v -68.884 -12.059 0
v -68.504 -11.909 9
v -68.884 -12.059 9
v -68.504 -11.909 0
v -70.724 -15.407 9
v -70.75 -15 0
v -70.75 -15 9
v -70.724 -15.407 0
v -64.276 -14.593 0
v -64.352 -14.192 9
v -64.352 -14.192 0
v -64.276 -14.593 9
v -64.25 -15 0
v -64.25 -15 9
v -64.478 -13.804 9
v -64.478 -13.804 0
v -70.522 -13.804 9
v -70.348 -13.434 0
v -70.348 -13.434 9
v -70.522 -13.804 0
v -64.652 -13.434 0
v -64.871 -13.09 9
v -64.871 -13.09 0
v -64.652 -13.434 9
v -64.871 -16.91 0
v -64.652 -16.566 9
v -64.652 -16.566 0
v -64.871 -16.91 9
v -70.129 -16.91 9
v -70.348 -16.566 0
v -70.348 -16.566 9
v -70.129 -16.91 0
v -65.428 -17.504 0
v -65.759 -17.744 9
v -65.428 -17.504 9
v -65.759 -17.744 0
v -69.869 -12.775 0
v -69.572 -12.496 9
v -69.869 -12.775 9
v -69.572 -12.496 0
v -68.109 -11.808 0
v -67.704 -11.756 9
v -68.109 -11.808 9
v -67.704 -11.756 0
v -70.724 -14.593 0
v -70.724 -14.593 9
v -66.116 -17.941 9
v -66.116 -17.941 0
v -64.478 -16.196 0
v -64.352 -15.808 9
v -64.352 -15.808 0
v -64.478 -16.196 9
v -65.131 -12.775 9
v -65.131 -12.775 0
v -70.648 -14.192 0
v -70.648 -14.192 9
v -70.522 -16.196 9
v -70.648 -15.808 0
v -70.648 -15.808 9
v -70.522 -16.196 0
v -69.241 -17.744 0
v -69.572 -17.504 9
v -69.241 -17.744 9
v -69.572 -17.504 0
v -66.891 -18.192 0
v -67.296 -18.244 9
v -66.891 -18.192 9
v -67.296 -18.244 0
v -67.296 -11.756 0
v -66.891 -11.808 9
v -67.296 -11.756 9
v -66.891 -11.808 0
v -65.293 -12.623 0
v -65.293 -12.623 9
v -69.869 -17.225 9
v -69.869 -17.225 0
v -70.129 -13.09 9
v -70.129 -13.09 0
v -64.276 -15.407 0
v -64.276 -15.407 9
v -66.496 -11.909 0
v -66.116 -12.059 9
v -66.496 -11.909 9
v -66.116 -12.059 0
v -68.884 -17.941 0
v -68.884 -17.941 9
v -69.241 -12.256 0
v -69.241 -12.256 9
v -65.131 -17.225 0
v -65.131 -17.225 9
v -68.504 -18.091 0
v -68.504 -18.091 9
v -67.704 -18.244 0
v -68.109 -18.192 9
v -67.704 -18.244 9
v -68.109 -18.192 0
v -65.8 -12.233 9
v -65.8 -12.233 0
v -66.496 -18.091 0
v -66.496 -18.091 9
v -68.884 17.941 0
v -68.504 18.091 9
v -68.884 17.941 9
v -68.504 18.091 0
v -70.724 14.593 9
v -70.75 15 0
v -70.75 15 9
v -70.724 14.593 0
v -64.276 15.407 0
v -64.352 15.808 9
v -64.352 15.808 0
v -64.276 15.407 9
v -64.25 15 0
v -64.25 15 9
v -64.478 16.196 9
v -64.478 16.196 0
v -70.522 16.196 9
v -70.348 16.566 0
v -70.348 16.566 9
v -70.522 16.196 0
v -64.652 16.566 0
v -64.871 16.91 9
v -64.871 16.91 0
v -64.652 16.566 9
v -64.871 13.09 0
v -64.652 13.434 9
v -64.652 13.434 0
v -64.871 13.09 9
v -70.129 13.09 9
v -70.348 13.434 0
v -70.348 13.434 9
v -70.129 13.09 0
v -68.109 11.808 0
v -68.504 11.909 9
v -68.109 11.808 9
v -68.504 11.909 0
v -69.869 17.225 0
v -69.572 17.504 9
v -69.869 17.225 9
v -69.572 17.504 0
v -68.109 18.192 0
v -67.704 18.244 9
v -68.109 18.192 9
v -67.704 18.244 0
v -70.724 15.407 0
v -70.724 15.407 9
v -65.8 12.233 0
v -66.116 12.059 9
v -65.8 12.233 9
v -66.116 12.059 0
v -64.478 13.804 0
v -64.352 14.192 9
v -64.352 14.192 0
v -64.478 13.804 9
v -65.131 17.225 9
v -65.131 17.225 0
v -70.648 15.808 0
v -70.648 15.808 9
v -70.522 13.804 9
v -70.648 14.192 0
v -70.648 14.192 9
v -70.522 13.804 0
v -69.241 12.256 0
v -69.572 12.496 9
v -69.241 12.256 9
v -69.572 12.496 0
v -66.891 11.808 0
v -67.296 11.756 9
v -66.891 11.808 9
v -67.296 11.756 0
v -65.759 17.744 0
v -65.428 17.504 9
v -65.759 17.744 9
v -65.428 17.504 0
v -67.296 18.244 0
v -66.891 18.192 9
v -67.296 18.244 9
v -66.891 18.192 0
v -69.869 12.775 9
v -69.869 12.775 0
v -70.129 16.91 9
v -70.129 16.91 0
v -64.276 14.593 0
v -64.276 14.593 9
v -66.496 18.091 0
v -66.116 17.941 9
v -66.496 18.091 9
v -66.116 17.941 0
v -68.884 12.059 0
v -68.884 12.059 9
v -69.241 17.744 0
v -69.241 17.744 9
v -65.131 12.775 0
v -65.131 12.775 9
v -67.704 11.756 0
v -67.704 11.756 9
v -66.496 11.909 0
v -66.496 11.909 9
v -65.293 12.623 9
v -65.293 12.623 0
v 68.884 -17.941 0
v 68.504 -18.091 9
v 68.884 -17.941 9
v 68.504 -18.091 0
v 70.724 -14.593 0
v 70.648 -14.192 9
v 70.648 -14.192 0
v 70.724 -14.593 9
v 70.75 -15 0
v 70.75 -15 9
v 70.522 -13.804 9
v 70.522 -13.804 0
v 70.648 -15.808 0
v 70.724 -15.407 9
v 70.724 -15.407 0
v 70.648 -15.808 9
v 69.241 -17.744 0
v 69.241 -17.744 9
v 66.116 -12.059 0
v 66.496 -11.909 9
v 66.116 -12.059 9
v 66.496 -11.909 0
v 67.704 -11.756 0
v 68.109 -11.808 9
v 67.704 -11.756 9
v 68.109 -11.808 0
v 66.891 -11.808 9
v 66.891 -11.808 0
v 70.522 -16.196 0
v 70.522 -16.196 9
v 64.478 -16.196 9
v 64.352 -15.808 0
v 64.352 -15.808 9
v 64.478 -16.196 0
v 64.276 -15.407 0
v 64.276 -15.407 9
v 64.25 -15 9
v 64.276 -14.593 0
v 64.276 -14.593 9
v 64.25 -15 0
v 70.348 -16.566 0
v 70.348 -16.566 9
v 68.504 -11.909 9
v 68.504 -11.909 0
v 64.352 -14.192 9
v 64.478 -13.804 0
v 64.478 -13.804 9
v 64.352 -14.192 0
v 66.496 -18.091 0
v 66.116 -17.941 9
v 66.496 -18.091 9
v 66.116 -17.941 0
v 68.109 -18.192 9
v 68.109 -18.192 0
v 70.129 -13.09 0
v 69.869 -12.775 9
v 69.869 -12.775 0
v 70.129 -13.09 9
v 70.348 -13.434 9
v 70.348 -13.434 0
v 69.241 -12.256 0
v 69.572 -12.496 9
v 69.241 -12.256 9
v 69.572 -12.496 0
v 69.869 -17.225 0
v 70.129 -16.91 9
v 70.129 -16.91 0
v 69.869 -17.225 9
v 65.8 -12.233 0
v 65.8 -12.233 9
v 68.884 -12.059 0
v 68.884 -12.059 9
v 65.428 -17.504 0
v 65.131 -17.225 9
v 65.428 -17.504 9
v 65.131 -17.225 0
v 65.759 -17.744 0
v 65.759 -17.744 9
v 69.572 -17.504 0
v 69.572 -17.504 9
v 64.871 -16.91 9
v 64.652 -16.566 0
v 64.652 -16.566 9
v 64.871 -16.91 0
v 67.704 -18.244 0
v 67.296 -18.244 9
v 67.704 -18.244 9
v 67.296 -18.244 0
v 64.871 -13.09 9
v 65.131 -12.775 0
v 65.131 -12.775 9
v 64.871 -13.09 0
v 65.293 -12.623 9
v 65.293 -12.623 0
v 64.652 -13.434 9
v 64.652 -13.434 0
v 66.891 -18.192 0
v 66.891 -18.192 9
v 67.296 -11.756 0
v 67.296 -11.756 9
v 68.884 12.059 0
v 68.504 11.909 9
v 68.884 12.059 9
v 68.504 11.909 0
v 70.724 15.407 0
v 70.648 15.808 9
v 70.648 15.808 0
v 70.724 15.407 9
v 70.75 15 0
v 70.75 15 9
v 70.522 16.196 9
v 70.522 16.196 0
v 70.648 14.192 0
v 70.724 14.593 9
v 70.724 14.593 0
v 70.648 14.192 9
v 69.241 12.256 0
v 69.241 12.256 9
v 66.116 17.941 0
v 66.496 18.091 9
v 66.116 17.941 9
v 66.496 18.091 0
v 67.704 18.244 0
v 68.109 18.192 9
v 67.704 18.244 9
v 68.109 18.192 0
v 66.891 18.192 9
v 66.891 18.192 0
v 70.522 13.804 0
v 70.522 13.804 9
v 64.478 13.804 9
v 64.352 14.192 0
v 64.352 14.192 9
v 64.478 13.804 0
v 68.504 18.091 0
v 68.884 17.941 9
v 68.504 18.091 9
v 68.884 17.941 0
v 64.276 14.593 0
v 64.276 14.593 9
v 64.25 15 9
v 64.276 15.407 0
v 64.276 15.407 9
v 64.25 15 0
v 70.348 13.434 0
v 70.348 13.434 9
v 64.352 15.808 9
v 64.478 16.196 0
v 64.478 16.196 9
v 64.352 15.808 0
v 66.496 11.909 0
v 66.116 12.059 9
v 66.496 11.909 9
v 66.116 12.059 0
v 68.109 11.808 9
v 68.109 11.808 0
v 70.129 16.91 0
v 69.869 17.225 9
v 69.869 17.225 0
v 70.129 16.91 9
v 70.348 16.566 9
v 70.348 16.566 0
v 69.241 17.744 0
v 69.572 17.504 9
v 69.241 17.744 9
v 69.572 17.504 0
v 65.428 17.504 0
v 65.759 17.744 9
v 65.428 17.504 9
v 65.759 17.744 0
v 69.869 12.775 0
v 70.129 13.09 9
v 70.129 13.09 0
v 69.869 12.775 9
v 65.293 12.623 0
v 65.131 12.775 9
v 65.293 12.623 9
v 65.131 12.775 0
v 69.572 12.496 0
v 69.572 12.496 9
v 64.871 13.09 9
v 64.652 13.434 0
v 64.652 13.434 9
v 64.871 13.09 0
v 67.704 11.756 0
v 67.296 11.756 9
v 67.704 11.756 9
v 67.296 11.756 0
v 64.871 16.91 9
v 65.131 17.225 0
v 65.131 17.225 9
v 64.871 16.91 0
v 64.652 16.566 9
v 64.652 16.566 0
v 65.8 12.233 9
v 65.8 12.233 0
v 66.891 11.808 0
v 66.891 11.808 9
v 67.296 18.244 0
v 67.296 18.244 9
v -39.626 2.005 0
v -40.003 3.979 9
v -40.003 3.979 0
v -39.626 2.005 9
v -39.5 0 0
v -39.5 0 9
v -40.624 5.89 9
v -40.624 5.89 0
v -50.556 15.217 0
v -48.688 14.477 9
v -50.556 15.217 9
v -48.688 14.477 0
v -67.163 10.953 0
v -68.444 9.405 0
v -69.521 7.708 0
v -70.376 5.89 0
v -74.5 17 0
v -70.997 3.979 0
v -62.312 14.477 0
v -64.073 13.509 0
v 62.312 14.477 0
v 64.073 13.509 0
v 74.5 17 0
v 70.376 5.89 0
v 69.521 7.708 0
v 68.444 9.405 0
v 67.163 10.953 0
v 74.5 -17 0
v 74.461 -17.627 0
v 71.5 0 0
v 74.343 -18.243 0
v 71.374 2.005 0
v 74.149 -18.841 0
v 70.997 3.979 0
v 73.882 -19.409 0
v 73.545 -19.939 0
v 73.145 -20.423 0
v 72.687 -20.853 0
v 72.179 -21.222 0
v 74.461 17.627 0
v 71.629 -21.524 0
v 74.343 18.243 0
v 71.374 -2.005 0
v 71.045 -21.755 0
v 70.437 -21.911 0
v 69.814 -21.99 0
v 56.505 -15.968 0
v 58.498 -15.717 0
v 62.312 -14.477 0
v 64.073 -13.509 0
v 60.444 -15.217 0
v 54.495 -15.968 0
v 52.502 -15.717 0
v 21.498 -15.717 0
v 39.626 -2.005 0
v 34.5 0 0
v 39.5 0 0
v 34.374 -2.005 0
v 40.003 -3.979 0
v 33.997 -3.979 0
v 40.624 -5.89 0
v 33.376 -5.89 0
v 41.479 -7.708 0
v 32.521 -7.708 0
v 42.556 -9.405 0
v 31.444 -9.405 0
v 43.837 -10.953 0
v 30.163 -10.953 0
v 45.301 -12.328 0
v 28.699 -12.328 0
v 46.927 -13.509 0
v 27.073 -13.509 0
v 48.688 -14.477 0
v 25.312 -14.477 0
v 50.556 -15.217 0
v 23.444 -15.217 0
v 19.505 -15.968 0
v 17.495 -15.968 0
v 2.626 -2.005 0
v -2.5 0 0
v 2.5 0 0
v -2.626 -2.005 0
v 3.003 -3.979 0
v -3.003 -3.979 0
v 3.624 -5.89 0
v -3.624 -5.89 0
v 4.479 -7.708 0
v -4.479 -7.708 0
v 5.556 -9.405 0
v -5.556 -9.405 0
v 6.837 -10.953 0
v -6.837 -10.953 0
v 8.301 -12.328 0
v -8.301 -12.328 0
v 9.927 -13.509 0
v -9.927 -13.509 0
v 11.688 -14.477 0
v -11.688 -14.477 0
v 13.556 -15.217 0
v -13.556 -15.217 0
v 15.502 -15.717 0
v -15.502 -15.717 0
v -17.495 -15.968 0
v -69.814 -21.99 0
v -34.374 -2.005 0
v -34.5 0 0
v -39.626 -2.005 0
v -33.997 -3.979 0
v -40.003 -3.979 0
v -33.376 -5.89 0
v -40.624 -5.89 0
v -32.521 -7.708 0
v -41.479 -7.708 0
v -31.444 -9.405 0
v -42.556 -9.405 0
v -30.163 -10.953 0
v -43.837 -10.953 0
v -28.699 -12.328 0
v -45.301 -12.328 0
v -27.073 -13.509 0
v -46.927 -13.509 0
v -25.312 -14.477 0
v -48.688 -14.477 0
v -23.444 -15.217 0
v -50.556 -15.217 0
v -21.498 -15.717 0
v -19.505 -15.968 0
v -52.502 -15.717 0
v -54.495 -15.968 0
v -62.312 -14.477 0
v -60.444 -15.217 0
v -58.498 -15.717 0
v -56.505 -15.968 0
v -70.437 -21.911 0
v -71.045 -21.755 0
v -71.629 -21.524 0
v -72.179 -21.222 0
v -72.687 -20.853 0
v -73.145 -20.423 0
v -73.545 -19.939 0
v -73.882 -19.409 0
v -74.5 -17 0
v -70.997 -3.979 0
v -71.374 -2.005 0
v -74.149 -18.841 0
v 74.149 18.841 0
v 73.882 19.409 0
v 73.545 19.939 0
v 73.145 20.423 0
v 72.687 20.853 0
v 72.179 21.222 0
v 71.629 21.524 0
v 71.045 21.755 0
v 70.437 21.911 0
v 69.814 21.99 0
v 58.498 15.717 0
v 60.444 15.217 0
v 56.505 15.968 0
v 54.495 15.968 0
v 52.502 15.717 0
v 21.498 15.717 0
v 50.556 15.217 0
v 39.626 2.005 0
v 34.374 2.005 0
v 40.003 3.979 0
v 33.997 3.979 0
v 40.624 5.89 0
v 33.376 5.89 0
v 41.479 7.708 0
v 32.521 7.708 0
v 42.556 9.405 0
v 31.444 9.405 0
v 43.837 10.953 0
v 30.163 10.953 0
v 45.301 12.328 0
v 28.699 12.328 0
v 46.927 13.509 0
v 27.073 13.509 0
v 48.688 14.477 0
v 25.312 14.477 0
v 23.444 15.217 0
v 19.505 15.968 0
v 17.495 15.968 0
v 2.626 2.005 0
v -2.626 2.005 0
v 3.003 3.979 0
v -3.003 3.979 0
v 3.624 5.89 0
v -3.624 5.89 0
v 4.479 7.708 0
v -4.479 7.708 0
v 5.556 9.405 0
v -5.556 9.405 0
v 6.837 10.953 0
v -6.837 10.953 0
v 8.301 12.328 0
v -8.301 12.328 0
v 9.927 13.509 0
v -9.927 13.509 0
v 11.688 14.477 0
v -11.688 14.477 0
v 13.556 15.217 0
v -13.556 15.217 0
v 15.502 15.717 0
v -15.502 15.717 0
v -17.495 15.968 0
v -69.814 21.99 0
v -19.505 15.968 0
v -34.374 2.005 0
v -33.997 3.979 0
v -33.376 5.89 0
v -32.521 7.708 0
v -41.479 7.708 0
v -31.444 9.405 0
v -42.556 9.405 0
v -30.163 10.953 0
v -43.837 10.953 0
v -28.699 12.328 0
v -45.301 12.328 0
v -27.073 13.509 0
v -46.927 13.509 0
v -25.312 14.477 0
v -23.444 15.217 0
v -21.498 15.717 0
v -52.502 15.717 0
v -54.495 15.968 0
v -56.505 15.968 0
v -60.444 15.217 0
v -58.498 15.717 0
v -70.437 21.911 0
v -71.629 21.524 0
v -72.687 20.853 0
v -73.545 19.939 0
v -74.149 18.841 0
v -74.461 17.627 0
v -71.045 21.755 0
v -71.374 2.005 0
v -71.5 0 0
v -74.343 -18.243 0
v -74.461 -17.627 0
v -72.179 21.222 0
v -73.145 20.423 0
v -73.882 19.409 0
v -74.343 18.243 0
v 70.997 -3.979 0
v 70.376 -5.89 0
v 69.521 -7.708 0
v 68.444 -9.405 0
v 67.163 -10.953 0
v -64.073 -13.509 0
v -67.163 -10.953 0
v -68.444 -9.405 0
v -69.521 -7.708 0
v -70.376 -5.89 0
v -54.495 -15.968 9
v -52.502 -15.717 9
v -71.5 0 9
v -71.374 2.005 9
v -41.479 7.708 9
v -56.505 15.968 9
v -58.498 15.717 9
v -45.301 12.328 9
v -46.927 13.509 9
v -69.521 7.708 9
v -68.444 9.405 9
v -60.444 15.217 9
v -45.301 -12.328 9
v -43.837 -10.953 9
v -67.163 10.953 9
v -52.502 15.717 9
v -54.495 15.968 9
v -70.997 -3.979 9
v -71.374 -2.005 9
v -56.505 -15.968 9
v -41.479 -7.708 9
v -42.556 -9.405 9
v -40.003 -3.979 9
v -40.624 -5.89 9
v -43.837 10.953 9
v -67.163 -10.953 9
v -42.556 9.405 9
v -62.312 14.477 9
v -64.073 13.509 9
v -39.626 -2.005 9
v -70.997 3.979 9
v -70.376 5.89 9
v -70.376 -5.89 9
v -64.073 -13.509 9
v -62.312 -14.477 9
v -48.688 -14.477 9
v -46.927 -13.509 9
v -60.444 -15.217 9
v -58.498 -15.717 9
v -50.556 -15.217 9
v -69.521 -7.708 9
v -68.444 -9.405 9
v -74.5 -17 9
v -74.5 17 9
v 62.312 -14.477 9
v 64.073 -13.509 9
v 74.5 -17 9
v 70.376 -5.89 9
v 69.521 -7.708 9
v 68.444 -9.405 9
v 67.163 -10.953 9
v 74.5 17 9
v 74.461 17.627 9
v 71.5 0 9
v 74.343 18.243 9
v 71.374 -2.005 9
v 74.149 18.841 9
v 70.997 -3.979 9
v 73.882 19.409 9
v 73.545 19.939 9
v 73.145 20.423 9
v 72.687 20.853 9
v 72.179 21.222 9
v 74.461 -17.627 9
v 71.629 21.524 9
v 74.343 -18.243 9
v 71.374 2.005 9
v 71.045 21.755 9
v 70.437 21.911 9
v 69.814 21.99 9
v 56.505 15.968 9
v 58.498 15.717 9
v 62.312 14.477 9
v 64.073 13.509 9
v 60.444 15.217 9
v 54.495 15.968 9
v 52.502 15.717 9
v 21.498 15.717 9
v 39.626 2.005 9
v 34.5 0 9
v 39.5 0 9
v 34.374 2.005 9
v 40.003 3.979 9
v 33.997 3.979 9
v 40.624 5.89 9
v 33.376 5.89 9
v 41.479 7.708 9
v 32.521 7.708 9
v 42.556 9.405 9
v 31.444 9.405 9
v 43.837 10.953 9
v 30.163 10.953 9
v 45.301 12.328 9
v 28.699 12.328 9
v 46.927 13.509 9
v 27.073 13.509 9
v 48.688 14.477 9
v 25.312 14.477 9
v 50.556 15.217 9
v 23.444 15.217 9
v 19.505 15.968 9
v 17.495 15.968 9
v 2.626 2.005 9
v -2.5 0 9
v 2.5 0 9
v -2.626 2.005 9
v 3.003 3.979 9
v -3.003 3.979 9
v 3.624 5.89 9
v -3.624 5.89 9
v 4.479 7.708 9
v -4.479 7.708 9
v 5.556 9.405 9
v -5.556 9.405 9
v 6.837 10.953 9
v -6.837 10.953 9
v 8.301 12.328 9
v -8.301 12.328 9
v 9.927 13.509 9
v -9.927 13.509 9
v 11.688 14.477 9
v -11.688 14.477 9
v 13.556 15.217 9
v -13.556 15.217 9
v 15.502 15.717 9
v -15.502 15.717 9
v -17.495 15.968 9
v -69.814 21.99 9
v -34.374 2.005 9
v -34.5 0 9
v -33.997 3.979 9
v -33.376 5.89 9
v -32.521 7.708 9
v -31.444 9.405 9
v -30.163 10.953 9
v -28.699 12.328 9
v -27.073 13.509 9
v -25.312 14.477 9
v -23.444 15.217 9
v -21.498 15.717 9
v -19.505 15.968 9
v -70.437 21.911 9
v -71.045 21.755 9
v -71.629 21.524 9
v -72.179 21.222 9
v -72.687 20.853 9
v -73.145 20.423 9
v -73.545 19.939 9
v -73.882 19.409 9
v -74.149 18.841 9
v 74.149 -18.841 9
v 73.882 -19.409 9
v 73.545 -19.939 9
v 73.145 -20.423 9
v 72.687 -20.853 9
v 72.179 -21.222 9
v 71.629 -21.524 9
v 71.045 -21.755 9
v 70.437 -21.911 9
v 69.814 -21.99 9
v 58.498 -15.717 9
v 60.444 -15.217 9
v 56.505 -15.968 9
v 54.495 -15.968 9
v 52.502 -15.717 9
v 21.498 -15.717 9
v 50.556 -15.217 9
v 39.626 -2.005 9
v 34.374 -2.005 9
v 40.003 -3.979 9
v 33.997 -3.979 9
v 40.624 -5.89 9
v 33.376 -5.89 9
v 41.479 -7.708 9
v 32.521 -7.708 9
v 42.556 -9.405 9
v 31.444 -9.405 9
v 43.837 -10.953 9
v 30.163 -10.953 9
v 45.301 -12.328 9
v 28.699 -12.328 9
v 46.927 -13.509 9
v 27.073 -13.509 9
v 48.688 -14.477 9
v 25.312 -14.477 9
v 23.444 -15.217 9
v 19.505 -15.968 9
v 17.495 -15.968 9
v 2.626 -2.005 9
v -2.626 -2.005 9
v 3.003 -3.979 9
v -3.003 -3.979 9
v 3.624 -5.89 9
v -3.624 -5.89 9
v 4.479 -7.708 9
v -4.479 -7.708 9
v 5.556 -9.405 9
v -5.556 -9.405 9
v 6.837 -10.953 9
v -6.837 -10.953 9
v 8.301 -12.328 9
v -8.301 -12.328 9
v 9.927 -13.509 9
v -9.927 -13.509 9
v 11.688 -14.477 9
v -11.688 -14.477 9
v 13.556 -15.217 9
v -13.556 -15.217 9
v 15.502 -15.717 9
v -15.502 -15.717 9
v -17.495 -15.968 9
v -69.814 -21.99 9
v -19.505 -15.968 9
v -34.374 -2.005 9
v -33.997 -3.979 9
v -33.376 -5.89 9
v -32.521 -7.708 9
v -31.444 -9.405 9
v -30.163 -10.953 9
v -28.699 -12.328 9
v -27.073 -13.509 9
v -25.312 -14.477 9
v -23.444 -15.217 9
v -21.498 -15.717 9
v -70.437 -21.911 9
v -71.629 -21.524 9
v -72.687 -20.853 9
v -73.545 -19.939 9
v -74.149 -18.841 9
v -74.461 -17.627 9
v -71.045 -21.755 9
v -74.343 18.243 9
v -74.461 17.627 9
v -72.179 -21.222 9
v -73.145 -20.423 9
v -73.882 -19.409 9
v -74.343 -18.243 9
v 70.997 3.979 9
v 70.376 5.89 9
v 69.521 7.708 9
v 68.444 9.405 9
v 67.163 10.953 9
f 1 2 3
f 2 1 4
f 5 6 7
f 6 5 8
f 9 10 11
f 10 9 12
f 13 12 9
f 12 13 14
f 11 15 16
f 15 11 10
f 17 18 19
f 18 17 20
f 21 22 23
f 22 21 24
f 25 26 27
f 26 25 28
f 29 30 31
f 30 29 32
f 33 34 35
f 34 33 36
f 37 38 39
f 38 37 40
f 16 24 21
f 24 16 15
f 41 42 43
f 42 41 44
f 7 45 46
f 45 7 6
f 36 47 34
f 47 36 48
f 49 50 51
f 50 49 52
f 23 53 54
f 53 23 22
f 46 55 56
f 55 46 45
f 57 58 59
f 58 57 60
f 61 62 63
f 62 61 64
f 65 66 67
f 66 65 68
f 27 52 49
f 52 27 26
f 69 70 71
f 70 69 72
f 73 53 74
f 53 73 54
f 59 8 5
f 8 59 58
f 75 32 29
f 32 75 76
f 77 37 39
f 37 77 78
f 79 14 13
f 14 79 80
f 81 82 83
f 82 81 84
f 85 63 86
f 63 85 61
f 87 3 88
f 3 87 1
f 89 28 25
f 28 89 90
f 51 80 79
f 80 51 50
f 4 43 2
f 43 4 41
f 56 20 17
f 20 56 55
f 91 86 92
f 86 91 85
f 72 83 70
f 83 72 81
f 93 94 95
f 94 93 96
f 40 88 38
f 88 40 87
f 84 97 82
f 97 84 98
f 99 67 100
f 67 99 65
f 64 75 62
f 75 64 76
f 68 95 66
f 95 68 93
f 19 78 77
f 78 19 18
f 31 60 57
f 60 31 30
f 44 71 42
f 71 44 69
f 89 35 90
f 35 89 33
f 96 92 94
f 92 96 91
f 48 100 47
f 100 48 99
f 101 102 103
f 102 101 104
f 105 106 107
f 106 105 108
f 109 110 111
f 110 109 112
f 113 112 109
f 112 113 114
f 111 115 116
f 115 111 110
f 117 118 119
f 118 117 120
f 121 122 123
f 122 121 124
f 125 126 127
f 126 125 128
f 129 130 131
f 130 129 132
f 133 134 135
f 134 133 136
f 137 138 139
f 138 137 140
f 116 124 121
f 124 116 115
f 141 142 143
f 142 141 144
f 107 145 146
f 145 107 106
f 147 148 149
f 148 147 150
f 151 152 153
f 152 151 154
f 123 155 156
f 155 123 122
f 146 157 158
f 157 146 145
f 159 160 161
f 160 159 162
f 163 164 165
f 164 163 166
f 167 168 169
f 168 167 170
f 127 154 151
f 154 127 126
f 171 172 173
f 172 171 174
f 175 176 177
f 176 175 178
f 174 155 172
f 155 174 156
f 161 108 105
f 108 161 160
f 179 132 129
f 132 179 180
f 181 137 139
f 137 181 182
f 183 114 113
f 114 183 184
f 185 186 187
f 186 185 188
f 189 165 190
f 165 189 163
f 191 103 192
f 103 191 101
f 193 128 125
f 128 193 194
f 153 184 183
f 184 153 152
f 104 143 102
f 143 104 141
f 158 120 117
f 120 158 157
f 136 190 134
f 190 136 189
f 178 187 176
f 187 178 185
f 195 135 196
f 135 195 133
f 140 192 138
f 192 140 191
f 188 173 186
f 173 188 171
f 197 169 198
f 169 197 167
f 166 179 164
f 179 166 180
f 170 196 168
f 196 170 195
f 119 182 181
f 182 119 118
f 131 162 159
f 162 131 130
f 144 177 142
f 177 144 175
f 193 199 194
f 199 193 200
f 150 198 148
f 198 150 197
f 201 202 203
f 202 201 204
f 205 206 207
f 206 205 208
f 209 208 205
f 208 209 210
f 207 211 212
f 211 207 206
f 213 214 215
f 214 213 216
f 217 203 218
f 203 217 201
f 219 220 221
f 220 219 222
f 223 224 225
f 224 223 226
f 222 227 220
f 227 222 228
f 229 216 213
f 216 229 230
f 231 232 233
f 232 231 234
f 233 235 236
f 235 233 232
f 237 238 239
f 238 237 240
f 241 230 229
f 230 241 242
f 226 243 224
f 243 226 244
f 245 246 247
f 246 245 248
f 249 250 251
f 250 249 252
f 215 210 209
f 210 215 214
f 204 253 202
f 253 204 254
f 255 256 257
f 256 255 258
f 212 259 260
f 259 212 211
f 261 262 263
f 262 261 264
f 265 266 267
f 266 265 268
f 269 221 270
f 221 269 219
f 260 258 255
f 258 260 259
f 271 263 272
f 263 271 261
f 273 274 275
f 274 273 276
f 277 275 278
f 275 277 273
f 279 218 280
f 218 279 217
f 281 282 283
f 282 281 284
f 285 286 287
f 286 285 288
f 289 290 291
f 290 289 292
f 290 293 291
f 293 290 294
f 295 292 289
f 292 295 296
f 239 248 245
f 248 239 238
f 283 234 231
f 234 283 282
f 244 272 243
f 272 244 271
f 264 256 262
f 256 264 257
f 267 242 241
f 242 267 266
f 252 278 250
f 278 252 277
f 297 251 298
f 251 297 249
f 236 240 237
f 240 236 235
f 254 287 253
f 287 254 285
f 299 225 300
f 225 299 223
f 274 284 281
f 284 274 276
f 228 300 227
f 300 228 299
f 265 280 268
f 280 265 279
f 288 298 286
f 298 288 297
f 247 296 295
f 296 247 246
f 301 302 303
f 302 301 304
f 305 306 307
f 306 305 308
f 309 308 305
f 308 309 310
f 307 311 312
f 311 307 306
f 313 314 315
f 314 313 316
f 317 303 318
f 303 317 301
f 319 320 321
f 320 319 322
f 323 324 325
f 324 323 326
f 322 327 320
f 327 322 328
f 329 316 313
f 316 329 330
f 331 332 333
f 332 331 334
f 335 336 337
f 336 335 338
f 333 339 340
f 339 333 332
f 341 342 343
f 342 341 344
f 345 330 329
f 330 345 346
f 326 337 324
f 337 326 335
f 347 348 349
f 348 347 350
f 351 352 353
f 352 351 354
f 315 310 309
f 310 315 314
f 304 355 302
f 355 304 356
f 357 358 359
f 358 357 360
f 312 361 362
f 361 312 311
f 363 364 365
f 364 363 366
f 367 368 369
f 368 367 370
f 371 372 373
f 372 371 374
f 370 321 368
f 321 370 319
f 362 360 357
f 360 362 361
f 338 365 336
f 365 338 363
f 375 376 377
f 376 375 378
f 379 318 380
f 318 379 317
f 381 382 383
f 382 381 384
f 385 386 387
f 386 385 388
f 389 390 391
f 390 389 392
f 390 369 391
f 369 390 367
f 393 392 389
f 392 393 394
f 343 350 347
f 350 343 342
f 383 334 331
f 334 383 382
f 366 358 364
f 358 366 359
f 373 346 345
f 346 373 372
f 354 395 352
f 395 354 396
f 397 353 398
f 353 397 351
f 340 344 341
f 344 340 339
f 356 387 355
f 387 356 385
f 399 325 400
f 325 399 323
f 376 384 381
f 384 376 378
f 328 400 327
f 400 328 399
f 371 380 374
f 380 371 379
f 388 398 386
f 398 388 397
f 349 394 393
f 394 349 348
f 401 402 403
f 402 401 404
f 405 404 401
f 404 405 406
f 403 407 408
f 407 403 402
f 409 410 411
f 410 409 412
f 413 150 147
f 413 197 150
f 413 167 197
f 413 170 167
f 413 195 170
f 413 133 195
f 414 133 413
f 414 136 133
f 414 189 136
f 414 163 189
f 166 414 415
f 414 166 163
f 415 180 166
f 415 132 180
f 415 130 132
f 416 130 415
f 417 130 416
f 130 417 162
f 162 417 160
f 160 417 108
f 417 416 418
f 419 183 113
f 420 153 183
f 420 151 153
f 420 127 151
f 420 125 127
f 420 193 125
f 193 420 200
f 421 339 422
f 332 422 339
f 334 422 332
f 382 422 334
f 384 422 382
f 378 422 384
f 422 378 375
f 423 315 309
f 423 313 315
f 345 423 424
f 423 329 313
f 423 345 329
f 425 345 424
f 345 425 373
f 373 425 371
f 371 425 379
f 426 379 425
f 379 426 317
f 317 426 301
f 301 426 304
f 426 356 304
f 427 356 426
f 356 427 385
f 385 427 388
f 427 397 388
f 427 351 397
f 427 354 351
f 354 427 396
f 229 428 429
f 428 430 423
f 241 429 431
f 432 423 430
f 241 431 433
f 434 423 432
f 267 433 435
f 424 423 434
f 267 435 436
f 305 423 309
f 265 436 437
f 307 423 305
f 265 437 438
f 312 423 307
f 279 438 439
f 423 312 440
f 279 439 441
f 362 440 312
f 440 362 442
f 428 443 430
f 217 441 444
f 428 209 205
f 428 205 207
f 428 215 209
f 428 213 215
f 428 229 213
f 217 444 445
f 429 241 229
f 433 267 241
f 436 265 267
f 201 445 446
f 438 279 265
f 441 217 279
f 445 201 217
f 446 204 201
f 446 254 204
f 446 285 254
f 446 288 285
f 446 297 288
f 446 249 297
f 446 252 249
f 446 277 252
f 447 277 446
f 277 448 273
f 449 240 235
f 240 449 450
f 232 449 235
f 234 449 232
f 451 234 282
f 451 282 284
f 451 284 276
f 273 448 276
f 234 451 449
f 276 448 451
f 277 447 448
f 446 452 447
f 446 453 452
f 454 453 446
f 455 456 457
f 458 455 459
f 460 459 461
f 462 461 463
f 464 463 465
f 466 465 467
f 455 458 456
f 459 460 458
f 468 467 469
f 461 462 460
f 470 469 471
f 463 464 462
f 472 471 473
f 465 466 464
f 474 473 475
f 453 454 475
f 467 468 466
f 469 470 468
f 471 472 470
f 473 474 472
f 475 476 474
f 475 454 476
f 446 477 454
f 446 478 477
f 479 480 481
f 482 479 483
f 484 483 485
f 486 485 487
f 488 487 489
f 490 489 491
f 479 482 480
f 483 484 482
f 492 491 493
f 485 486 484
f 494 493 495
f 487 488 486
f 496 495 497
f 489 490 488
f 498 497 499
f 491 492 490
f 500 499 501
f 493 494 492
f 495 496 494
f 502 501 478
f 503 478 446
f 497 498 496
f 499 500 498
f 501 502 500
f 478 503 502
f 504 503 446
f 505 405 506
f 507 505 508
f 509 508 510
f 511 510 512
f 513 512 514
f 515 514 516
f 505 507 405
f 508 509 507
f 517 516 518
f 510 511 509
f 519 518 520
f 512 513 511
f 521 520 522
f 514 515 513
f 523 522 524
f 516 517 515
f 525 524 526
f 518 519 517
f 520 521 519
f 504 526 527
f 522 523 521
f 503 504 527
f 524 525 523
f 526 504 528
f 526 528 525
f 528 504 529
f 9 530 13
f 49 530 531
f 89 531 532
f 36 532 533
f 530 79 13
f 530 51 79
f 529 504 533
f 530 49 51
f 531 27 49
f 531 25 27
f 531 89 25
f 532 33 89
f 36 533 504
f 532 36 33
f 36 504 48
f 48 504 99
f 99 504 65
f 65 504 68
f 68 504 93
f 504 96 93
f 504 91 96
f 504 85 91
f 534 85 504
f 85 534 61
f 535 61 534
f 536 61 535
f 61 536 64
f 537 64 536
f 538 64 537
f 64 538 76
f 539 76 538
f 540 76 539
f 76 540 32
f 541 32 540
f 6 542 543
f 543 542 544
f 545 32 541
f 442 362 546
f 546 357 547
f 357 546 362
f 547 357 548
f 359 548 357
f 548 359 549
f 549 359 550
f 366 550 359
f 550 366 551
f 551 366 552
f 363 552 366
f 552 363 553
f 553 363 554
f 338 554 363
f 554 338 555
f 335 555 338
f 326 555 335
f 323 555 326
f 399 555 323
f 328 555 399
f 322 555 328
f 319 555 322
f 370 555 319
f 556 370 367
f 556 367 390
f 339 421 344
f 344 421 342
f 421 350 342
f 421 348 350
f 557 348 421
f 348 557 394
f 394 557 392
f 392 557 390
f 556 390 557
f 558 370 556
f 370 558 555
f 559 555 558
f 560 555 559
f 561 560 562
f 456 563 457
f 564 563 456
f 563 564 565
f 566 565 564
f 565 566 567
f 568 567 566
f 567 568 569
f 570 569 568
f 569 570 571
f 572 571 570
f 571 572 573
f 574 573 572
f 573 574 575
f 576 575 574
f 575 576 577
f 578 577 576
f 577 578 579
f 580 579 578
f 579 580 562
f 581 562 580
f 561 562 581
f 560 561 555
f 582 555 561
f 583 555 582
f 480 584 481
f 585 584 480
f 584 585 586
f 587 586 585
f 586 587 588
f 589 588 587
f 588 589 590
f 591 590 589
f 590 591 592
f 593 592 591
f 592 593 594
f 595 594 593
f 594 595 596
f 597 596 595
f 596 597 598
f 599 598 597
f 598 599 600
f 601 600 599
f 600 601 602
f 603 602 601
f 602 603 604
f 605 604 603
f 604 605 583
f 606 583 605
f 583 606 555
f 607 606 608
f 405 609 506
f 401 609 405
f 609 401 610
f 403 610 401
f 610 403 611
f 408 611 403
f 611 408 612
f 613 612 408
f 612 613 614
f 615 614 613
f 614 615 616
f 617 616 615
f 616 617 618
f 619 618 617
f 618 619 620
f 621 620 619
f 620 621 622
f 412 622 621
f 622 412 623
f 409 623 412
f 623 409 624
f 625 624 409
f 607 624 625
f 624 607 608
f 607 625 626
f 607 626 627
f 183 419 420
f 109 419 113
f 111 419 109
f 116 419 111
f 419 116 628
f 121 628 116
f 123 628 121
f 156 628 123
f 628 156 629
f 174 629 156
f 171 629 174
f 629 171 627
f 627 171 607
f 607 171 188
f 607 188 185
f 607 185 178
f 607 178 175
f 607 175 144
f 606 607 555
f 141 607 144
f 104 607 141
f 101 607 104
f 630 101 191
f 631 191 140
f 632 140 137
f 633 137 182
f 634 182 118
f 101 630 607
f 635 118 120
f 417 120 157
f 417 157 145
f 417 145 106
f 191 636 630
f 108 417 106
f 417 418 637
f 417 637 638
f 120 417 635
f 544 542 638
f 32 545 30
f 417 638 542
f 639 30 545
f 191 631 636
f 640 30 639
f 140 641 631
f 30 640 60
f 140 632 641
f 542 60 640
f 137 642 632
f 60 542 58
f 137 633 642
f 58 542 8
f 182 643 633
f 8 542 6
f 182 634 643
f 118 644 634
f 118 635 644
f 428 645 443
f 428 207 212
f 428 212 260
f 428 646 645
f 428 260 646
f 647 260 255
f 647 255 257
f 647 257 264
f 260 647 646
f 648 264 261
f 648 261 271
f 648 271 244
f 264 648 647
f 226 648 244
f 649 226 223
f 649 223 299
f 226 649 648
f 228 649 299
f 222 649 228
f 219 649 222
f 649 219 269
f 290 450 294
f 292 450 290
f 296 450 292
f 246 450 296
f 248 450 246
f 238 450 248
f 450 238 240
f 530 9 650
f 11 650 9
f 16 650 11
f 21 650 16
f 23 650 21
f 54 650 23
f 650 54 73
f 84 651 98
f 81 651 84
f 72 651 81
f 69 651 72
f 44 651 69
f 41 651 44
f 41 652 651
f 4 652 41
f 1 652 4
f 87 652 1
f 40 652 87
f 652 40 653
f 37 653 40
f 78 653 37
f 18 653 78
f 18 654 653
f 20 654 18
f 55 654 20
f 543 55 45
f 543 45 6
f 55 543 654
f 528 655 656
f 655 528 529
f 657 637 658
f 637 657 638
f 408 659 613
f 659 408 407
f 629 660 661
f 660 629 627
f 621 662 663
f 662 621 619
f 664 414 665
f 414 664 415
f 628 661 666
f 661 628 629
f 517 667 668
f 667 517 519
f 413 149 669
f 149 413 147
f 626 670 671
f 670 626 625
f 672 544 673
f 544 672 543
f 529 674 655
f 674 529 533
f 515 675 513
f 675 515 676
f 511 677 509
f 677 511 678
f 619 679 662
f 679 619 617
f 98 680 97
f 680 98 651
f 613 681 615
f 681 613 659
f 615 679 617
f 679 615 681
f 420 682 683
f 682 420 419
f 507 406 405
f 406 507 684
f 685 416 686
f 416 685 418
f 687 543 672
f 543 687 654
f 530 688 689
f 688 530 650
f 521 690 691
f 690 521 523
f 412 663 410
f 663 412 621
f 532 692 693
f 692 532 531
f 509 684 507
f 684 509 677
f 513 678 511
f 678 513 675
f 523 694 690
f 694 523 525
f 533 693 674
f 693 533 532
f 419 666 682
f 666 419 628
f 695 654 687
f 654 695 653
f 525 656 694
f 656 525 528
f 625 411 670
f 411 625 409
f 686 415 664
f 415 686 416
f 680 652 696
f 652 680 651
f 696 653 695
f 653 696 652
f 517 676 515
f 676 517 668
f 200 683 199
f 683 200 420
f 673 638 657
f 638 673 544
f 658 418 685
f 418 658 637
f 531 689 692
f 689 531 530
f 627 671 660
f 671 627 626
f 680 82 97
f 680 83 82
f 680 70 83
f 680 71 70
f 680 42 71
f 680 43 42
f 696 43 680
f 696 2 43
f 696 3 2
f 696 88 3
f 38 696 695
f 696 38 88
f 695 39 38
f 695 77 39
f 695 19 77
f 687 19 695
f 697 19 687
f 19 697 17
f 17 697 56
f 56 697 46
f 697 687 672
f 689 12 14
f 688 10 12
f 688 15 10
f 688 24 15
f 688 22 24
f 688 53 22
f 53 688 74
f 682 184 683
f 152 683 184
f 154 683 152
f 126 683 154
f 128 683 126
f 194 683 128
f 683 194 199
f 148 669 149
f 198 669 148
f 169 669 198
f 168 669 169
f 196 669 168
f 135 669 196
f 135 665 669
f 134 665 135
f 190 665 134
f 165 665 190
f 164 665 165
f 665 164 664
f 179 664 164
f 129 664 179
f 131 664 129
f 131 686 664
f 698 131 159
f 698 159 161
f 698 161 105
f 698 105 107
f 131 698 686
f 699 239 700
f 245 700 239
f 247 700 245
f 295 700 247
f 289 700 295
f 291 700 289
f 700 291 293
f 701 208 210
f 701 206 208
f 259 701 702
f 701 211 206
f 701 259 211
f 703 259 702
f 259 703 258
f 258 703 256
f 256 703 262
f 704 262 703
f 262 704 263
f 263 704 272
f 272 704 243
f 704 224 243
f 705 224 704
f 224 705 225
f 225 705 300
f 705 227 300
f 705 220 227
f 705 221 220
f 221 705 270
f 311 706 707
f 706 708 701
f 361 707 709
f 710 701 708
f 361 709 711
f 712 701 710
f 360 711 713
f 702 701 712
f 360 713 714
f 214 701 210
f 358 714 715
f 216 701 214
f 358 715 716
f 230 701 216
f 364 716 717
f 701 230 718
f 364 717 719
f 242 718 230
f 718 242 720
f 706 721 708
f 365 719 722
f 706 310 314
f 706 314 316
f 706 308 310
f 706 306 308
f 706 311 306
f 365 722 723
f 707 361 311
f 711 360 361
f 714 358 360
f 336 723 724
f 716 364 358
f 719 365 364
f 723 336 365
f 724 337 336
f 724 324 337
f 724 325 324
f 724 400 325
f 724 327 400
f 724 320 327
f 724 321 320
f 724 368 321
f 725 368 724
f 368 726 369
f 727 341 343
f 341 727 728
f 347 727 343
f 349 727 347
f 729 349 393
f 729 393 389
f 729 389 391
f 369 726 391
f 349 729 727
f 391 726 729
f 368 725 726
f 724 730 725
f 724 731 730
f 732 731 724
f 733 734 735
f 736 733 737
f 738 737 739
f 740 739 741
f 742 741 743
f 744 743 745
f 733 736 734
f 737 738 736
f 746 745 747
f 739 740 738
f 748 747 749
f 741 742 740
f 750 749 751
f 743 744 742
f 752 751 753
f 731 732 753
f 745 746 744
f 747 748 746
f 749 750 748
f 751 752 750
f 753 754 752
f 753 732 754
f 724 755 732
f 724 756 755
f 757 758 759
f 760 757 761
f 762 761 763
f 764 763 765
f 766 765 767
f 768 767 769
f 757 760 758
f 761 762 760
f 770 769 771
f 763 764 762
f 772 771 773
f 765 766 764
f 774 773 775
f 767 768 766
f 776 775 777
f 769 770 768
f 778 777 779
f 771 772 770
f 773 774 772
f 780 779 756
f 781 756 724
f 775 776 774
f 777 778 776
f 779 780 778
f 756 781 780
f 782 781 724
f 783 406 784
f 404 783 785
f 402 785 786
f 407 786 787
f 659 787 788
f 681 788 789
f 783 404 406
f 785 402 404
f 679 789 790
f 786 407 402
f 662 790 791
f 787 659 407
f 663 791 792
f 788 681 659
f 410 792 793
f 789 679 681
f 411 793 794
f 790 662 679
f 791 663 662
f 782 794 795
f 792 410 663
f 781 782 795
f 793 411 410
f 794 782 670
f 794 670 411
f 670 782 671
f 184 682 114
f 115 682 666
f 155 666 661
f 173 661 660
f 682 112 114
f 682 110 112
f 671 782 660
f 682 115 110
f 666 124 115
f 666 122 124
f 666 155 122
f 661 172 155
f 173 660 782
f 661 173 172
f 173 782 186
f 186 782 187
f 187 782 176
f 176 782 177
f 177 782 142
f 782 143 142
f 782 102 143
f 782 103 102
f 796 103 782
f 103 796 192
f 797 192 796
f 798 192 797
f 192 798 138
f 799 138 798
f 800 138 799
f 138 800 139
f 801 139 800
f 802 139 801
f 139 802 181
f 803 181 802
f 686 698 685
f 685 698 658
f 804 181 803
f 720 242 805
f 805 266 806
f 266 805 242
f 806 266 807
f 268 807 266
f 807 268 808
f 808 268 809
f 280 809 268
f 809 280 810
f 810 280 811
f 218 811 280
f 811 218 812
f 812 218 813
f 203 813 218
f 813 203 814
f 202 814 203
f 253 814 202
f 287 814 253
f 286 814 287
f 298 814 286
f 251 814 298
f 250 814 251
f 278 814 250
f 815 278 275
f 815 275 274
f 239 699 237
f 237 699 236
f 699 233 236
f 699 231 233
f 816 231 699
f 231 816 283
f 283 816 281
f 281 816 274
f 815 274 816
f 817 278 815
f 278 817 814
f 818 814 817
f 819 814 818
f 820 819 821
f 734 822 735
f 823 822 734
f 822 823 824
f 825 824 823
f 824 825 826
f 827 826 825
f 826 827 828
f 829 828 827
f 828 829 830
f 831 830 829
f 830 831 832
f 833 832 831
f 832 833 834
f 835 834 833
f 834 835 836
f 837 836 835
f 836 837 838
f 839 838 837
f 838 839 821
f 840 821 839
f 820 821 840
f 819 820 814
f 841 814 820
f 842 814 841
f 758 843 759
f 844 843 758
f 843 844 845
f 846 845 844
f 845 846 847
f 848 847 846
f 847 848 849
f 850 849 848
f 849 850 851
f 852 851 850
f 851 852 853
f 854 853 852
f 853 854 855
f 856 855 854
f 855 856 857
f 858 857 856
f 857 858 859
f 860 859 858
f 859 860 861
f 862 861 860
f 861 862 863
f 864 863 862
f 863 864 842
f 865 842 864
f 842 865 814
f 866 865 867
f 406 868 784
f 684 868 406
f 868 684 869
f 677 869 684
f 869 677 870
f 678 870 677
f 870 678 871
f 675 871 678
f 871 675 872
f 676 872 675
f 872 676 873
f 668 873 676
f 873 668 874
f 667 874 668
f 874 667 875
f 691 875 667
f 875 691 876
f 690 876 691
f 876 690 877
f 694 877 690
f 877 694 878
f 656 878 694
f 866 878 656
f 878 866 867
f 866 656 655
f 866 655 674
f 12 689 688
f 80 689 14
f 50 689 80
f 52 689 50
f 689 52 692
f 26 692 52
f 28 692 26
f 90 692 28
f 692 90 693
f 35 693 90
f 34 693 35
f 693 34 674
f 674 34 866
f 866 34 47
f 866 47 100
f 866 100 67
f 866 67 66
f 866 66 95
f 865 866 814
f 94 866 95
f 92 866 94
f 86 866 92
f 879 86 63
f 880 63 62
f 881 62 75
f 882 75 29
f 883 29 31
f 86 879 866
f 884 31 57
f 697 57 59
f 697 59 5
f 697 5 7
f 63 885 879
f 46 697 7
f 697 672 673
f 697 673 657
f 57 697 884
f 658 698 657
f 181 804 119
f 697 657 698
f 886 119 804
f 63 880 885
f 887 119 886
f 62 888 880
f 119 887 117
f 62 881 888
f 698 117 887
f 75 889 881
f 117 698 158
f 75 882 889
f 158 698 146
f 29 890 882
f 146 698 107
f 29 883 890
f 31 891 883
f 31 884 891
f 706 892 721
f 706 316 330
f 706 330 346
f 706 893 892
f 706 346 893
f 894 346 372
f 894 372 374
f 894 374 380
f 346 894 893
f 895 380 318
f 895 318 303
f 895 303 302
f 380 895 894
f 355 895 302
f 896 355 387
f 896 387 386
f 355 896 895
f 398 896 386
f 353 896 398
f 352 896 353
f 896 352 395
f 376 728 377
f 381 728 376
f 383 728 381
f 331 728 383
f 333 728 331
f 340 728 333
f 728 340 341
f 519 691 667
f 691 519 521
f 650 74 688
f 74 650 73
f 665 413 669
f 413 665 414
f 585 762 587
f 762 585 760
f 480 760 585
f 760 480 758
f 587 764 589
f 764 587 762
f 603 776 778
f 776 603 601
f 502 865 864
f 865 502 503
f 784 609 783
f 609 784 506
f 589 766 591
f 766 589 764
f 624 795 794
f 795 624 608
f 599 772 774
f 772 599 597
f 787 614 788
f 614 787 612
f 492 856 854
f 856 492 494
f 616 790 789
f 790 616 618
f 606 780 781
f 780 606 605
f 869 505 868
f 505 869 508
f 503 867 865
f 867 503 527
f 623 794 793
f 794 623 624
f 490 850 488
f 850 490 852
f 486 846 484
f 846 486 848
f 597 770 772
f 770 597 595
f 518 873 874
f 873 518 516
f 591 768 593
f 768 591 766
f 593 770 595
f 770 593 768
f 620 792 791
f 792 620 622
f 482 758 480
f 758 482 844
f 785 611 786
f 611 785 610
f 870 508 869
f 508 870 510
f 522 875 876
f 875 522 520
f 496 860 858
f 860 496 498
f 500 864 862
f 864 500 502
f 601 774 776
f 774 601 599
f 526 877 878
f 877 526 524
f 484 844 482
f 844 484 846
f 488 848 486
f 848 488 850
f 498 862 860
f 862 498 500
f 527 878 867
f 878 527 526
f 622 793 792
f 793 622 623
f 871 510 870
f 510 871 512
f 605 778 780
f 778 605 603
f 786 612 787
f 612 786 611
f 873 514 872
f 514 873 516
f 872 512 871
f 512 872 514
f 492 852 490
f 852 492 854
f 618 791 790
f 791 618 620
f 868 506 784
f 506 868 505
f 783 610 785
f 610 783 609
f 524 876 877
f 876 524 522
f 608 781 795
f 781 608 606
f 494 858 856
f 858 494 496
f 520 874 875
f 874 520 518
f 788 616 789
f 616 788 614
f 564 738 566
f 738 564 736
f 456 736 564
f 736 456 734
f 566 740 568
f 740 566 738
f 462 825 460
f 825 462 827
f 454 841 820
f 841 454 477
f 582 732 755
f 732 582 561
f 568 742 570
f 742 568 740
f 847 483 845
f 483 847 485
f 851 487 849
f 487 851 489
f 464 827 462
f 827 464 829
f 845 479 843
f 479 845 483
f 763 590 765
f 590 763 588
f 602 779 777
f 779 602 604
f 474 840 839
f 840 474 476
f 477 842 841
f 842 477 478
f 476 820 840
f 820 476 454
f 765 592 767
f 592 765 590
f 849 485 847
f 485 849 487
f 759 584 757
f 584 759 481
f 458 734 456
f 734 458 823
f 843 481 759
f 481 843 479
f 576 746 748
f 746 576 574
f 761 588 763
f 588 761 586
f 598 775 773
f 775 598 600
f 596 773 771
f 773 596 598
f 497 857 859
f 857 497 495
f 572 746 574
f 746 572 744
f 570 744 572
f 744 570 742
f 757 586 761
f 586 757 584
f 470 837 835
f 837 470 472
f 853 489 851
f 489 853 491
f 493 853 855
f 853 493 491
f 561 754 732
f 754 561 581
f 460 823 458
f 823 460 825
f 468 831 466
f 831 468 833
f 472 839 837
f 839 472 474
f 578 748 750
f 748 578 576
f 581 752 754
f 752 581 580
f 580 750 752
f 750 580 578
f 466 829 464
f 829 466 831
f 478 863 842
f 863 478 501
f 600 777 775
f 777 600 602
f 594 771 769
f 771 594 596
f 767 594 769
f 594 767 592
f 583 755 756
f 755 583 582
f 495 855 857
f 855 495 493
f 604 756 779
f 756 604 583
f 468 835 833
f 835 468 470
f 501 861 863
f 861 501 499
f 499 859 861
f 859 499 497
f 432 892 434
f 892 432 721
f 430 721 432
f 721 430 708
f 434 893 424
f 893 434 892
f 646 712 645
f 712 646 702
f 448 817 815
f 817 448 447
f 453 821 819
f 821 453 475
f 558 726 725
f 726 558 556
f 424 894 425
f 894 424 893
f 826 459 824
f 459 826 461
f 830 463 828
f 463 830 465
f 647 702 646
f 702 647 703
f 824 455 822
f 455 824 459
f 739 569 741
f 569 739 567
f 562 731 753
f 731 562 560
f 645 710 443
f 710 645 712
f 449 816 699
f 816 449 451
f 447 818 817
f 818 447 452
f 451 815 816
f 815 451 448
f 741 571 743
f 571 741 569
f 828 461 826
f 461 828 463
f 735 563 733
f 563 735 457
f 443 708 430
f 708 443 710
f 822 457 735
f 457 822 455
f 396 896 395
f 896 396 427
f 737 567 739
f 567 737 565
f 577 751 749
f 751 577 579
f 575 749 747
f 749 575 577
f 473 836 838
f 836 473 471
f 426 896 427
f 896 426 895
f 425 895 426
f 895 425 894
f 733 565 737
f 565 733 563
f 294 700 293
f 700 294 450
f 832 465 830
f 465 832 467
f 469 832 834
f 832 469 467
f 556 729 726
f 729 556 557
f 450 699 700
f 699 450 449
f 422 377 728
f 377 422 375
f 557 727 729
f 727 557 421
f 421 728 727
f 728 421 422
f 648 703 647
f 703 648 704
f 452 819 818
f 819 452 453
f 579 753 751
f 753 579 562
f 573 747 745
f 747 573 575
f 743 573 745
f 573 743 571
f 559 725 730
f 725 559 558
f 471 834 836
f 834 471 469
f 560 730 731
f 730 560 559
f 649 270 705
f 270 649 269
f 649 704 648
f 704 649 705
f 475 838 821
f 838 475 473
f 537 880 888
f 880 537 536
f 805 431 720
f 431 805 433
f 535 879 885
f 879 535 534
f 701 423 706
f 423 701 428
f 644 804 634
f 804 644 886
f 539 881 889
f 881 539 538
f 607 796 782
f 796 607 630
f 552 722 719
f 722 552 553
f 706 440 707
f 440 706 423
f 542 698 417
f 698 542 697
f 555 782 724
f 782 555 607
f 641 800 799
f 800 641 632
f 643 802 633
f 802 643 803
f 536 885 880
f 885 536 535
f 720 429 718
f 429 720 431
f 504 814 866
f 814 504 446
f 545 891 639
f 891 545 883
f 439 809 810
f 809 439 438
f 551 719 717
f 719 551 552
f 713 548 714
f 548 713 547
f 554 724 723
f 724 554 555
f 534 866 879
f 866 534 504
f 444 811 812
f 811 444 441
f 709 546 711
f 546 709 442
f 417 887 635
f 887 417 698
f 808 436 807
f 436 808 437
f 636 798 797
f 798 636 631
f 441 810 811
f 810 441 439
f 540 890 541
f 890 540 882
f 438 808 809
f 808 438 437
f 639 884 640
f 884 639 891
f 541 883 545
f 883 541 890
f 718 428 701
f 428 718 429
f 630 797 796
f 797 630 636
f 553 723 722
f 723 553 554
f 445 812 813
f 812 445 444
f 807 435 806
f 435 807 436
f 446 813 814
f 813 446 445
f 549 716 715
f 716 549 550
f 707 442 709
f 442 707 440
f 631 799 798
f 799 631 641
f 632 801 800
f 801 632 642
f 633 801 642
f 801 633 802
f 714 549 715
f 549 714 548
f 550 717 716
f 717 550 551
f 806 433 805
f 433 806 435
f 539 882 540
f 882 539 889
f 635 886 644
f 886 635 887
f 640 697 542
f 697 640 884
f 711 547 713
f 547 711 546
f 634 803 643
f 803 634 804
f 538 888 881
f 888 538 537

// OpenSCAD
$fn = 50;


difference() {
	union() {
		hull() {
			translate(v = [-69.5000000000, 17.0000000000, 0]) {
				cylinder(h = 9, r = 5);
			}
			translate(v = [69.5000000000, 17.0000000000, 0]) {
				cylinder(h = 9, r = 5);
			}
			translate(v = [-69.5000000000, -17.0000000000, 0]) {
				cylinder(h = 9, r = 5);
			}
			translate(v = [69.5000000000, -17.0000000000, 0]) {
				cylinder(h = 9, r = 5);
			}
		}
	}
	union() {
		#translate(v = [-67.5000000000, -15.0000000000, -100.0000000000]) {
			cylinder(h = 200, r = 3.2500000000);
		}
		#translate(v = [-67.5000000000, 15.0000000000, -100.0000000000]) {
			cylinder(h = 200, r = 3.2500000000);
		}
		#translate(v = [67.5000000000, -15.0000000000, -100.0000000000]) {
			cylinder(h = 200, r = 3.2500000000);
		}
		#translate(v = [67.5000000000, 15.0000000000, -100.0000000000]) {
			cylinder(h = 200, r = 3.2500000000);
		}
		#translate(v = [-55.5000000000, 0, 0]) {
			cylinder(h = 9, r = 16.0000000000);
		}
		#translate(v = [-18.5000000000, 0, 0]) {
			cylinder(h = 9, r = 16.0000000000);
		}
		#translate(v = [18.5000000000, 0, 0]) {
			cylinder(h = 9, r = 16.0000000000);
		}
		#translate(v = [55.5000000000, 0, 0]) {
			cylinder(h = 9, r = 16.0000000000);
		}
	}
}
